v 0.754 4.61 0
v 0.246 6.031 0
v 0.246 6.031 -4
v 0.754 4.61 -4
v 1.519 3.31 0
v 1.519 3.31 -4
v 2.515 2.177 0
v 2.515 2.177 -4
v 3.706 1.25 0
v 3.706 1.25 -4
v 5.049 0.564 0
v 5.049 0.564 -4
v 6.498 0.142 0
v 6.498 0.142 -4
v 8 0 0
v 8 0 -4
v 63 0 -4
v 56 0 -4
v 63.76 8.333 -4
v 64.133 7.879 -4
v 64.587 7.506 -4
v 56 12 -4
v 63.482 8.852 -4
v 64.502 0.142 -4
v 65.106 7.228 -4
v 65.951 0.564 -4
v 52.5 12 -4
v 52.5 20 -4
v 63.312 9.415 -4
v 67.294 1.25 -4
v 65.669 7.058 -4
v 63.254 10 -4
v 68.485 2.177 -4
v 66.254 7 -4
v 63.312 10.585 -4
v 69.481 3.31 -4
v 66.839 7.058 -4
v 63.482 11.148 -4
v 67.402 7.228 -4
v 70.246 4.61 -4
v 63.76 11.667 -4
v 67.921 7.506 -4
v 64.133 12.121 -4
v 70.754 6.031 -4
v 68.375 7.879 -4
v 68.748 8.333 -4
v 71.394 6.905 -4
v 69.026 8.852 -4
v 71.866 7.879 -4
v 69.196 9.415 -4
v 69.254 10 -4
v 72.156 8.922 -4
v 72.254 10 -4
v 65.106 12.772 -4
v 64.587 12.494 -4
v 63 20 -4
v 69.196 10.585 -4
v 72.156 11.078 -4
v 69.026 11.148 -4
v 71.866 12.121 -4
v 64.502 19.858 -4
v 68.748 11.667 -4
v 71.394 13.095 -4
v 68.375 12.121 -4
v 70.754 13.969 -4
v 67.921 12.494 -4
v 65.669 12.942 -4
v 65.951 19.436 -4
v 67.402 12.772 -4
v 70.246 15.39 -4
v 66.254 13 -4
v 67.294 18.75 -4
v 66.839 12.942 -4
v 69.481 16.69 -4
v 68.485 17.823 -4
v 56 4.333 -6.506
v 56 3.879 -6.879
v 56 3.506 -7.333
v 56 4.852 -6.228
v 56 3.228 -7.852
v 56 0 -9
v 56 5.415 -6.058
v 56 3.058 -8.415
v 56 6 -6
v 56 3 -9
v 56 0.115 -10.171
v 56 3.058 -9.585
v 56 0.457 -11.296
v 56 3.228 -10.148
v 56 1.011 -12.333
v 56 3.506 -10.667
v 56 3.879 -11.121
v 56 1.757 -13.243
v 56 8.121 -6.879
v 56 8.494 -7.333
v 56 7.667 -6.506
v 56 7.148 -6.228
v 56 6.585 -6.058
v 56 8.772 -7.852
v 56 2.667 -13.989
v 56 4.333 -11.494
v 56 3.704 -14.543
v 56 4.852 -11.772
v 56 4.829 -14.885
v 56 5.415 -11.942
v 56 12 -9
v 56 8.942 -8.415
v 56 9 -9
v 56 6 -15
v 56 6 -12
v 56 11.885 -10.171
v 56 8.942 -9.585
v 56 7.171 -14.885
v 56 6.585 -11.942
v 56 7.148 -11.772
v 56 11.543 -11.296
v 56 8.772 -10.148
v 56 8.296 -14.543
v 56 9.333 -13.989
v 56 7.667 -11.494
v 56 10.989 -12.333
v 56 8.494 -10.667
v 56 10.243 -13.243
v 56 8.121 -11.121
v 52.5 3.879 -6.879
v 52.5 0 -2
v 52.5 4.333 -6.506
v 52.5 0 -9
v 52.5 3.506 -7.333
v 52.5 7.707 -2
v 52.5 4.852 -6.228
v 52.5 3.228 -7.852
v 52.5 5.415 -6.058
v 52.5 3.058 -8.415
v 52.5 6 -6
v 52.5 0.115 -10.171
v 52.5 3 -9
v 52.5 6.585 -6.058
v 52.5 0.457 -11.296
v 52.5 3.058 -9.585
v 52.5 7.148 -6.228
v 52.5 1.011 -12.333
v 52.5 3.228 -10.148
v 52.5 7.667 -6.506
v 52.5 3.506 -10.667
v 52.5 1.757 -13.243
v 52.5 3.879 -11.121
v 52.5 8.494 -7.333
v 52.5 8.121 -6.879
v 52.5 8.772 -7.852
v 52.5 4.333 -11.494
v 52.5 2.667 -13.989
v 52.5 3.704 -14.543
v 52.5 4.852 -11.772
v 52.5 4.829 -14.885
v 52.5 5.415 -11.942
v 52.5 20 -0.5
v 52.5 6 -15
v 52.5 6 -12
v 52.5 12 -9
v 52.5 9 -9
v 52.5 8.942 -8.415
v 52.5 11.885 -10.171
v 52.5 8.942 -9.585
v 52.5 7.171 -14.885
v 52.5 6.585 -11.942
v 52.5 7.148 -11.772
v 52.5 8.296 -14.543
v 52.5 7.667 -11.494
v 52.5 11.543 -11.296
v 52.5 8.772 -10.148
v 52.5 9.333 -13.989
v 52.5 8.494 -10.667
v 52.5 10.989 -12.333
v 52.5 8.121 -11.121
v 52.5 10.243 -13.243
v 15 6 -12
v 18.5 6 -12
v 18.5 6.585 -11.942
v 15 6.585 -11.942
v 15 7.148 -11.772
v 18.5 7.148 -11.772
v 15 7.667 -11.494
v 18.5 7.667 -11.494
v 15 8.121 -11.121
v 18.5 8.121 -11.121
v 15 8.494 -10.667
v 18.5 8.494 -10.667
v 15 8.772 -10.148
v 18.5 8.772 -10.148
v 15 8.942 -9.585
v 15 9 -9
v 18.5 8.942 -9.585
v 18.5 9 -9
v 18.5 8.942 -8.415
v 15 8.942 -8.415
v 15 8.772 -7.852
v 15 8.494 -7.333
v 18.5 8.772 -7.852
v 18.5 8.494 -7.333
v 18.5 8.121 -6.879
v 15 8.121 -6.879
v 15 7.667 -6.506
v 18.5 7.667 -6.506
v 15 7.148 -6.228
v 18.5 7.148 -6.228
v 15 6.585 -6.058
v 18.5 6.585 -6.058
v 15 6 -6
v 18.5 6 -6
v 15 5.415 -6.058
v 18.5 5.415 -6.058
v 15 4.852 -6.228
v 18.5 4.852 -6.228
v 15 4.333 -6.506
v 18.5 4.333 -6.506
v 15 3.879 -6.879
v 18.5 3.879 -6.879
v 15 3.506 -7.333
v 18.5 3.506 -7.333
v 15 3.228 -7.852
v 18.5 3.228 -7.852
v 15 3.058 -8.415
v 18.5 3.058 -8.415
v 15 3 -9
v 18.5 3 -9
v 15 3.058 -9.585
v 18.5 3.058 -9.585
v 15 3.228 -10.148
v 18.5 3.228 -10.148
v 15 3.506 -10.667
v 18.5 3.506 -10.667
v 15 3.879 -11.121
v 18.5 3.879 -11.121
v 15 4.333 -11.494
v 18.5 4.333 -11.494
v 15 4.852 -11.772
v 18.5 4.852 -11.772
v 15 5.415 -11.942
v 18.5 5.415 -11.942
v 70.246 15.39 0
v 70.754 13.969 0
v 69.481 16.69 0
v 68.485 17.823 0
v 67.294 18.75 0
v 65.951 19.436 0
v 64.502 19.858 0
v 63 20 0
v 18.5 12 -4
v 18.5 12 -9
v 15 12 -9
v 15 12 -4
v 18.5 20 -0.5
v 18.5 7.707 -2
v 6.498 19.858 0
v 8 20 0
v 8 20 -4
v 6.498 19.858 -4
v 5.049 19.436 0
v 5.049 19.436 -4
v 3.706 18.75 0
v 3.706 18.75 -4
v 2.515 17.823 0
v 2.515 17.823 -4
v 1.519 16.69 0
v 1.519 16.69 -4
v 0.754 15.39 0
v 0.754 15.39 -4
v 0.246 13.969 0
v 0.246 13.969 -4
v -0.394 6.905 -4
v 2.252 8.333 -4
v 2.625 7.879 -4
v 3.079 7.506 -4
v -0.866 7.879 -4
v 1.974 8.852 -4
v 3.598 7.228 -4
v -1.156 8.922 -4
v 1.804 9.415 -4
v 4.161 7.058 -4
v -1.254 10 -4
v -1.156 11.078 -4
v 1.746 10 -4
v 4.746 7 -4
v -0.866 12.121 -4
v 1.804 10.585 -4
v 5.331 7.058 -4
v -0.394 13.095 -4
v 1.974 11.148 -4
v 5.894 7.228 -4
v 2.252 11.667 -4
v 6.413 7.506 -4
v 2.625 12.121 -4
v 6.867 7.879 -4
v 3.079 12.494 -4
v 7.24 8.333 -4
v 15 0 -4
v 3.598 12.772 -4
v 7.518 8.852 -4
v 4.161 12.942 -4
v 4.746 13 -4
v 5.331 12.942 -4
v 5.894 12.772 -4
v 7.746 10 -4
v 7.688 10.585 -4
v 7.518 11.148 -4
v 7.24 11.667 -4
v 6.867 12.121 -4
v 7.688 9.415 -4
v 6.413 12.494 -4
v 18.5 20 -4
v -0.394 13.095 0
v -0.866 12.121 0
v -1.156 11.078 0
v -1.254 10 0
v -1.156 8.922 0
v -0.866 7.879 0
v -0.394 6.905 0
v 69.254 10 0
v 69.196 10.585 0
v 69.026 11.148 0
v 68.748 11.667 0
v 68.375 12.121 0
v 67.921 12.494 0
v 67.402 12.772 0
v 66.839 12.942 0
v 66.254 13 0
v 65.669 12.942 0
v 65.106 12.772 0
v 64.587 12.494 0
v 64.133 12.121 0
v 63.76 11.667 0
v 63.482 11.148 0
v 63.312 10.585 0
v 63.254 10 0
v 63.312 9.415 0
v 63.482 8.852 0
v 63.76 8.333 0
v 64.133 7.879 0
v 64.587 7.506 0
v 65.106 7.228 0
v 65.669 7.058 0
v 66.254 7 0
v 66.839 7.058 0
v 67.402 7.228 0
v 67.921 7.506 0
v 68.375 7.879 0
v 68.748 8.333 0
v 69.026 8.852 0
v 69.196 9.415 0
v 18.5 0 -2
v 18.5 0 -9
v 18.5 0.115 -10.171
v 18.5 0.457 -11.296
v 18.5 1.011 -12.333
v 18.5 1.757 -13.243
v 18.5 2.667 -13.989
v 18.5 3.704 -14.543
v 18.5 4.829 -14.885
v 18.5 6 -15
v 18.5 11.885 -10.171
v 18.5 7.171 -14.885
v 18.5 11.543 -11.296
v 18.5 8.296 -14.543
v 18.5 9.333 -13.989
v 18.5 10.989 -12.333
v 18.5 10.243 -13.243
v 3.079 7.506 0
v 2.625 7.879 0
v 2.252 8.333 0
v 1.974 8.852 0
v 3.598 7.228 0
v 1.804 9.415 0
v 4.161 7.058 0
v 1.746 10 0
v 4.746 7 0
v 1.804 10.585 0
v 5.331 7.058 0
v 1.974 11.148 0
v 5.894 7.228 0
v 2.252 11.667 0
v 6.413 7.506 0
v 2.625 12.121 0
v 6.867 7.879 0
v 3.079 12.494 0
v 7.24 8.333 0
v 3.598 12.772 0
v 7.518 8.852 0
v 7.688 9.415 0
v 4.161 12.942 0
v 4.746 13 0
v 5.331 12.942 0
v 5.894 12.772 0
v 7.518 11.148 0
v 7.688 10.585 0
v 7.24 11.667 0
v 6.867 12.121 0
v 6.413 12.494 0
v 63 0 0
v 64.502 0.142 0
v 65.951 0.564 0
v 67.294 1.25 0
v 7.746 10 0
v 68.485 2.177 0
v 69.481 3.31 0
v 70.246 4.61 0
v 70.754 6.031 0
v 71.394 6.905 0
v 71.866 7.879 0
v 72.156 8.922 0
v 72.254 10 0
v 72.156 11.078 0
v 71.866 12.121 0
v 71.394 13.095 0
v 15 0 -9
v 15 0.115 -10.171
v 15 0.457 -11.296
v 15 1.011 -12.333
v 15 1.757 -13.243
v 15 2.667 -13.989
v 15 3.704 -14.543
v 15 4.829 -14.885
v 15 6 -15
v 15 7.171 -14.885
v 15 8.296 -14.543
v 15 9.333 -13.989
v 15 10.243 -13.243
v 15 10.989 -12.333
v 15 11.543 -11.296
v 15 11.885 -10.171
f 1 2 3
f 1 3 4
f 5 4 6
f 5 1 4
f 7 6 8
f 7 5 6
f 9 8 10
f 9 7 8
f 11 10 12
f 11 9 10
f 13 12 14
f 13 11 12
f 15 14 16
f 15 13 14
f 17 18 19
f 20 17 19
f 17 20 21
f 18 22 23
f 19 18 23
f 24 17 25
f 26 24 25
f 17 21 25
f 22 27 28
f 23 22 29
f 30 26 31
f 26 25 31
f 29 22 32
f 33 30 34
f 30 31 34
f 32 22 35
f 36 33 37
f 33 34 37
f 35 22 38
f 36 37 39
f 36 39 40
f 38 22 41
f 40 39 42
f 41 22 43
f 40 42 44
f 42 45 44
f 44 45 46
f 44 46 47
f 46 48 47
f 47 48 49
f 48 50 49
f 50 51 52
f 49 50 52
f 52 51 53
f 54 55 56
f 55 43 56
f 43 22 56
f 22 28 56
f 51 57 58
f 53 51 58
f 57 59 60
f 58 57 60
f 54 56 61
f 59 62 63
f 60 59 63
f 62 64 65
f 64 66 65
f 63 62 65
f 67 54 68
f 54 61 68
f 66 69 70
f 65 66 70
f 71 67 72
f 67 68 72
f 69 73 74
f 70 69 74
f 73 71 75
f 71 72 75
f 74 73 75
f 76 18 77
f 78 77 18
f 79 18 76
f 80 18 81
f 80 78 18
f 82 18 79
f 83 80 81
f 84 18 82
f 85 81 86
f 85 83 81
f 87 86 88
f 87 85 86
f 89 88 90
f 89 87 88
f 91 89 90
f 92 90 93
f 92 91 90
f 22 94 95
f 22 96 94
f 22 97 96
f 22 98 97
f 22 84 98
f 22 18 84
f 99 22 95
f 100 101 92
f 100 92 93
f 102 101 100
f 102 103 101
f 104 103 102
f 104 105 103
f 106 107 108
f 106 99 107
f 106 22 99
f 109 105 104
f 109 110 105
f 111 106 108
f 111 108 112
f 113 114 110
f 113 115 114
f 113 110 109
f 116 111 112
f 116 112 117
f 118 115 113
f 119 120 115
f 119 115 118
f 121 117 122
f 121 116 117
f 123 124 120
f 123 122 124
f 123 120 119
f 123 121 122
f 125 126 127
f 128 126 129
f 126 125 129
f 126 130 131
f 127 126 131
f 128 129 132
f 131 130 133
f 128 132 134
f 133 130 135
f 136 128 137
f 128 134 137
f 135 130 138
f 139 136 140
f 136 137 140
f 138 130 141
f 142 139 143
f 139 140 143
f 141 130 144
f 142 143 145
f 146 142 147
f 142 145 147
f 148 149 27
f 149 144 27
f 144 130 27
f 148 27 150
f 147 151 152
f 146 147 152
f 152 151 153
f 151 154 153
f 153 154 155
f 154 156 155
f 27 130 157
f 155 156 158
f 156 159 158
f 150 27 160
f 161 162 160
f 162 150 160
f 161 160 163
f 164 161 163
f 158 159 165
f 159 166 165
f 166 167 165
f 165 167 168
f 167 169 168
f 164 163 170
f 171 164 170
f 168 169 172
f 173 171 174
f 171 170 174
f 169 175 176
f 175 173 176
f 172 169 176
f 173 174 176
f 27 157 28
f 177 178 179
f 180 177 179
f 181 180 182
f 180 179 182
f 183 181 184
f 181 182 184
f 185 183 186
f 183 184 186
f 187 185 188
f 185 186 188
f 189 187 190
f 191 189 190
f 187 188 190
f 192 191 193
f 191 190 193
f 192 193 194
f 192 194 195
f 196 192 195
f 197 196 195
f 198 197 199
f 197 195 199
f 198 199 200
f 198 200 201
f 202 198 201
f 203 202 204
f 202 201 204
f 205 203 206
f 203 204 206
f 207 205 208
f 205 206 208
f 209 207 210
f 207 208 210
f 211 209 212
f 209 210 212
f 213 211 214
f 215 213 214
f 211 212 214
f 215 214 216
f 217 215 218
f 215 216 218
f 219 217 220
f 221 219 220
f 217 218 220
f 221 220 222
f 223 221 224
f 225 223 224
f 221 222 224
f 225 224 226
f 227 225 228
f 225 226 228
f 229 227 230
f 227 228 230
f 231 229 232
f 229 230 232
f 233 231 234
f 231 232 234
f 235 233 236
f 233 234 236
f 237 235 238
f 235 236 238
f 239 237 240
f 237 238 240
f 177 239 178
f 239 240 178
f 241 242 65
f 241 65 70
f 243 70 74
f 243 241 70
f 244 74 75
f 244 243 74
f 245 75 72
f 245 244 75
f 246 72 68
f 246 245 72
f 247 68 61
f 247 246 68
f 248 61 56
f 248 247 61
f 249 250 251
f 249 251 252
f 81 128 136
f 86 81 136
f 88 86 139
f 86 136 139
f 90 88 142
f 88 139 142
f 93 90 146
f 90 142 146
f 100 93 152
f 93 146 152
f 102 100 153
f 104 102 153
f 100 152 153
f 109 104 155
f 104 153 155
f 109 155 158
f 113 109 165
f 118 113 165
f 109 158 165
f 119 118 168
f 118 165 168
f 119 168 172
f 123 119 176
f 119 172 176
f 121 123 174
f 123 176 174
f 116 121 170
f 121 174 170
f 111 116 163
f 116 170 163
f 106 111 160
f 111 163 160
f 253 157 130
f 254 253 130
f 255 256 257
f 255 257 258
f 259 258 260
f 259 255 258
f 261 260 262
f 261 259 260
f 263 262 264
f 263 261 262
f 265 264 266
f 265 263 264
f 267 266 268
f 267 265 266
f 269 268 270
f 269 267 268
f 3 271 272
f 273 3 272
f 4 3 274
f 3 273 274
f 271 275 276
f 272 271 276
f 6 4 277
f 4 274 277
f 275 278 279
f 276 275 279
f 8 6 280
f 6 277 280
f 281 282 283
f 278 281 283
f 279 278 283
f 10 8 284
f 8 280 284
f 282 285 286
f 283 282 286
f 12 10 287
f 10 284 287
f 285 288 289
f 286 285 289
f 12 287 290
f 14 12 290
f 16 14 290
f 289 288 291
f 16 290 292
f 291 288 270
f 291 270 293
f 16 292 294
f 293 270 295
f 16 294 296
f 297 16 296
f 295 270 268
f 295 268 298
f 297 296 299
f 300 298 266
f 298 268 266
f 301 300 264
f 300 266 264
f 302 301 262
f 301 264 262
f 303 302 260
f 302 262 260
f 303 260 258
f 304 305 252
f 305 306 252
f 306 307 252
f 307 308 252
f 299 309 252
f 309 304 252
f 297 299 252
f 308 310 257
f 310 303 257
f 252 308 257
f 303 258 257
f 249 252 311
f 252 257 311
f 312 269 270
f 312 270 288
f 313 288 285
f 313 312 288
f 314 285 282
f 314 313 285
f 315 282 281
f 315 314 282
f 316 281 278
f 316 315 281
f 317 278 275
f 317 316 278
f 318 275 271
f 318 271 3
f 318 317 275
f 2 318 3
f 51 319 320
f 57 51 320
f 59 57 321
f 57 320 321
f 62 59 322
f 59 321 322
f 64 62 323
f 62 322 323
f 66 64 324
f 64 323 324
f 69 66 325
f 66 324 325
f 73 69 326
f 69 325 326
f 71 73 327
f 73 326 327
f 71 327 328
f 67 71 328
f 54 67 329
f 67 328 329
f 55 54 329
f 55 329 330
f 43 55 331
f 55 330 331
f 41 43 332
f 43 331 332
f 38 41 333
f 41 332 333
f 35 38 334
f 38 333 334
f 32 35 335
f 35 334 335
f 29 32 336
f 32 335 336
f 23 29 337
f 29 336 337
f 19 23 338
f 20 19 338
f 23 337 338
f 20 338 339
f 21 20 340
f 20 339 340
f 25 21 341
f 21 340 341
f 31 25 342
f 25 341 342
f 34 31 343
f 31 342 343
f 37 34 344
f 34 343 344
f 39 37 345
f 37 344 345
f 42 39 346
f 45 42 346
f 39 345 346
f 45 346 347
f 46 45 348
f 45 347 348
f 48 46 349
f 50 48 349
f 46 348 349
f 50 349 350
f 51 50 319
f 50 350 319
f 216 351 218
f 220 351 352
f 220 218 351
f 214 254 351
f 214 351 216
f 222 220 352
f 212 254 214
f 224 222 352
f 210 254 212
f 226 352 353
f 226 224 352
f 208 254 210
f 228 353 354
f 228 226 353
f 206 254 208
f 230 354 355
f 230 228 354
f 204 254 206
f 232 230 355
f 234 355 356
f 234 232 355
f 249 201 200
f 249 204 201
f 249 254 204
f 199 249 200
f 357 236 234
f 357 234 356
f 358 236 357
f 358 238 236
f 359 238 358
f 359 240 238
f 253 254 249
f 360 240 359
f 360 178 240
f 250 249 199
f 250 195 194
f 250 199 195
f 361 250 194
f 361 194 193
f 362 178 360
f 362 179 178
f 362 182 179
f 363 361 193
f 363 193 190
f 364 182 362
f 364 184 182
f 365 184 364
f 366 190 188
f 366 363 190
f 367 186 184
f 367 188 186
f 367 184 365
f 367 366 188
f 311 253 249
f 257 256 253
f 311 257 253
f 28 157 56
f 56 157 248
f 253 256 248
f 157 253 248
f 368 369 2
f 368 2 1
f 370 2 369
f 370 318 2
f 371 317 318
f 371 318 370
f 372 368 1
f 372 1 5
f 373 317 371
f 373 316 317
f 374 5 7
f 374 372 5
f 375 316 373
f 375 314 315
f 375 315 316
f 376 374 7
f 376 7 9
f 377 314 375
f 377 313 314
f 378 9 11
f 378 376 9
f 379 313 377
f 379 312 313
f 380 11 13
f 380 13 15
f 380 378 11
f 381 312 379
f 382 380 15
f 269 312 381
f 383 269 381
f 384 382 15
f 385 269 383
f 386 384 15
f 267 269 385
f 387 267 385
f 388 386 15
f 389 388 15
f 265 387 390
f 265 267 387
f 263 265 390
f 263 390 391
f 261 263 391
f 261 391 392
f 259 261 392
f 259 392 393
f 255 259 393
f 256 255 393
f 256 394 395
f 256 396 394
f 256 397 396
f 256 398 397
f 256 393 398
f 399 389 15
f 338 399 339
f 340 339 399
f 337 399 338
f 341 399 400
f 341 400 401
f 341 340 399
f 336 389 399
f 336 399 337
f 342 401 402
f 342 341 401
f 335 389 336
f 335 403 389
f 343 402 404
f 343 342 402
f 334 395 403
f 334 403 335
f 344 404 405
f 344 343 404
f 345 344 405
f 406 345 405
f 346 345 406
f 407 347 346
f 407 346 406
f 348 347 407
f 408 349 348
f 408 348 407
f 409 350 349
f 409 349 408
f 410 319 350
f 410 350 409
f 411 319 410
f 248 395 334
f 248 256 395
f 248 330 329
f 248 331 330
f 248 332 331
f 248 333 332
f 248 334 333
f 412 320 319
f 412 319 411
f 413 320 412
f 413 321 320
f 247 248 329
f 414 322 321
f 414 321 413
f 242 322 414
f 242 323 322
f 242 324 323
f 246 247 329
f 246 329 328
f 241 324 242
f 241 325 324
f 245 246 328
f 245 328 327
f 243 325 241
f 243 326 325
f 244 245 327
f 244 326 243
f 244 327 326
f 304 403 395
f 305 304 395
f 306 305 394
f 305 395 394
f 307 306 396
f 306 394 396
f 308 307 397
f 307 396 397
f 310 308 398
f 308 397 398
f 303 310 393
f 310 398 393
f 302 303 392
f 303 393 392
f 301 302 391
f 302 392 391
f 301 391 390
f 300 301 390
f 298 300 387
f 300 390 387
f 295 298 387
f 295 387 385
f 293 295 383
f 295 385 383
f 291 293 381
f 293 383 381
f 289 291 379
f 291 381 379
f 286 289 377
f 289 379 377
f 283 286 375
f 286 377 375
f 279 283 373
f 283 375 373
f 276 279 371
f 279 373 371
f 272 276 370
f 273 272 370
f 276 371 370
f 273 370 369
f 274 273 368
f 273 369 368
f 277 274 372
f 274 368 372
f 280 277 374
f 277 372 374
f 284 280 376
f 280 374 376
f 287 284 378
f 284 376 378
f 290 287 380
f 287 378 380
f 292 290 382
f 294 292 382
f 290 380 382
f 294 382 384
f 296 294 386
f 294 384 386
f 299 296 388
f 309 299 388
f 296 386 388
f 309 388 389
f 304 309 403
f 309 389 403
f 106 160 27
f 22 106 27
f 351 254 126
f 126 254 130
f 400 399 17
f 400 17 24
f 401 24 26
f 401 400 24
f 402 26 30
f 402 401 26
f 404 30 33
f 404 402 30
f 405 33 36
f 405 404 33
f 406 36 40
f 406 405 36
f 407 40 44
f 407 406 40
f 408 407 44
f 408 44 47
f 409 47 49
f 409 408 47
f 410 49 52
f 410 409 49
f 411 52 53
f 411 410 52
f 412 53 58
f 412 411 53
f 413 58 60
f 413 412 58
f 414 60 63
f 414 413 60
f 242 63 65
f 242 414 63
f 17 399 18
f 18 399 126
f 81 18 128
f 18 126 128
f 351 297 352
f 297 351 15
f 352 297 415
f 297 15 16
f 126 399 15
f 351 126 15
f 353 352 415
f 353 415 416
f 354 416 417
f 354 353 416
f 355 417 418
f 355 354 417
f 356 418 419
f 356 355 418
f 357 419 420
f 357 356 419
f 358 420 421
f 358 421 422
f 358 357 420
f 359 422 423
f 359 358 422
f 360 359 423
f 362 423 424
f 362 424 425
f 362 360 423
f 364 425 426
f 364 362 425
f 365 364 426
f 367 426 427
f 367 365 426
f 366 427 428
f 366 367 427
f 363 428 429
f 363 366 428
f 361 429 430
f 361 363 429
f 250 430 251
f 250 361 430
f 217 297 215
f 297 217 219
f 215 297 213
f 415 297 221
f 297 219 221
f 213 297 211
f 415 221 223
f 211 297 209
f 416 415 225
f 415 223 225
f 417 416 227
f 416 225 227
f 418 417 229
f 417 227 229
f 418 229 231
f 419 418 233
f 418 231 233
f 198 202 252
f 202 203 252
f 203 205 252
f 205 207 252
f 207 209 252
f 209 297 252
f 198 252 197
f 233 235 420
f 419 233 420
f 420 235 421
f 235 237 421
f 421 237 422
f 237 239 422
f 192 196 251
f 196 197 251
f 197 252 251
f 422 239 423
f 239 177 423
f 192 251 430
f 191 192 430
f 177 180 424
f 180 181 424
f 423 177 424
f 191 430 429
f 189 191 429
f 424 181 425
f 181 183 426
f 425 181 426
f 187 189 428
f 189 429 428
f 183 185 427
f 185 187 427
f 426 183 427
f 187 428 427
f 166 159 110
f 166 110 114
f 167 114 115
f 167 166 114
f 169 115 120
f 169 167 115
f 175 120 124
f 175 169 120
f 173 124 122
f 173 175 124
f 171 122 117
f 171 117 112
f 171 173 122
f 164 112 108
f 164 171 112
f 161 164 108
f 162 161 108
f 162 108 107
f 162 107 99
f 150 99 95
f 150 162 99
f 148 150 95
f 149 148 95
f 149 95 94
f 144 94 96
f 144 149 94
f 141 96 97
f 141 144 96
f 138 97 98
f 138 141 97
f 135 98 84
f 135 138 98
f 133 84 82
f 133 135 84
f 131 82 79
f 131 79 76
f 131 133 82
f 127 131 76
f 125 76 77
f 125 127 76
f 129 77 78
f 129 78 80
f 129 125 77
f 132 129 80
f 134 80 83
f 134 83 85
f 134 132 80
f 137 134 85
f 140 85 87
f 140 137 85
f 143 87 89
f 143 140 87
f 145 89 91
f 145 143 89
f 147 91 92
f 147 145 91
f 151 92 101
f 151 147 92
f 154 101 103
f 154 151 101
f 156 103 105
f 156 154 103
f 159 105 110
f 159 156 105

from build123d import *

# Parameters (mm, degrees)
SKETCH1_R             = 3
BOSS_EXTRUDE3_DEPTH   = 4
BOSS_EXTRUDE3_2_DEPTH = 4
SKETCH1_9_W           = 34
SKETCH1_9_H           = 20
BOSS_EXTRUDE4_DEPTH   = 2
CUT_EXTRUDE1_DEPTH    = 34
SKETCH3_R             = 3
BOSS_EXTRUDE5_DEPTH   = 3.5


with BuildPart() as part:
    # Sketch1 → Boss-Extrude3 (new body)
    with BuildSketch(Plane.XY):
        with BuildLine():
            ThreePointArc((0.246000737, 6.031372198), (3.088229566, 1.685373233), (8, 0))
            Line((8, 0), (18.5, 0))
            Line((18.5, 0), (18.5, 20))
            Line((18.5, 20), (8, 20))
            ThreePointArc((8, 20), (3.088229566, 18.314626767), (0.246000737, 13.968627802))
            ThreePointArc((0.246000737, 13.968627802), (-1.254, 10), (0.246000737, 6.031372198))
        make_face()
        with Locations((4.746, 10)):
            Circle(SKETCH1_R, mode=Mode.SUBTRACT)
    extrude(amount=-BOSS_EXTRUDE3_DEPTH)



with BuildPart() as body_2:
    # Sketch1 → Boss-Extrude3 2 (new body)
    with BuildSketch(Plane.XY):
        with BuildLine():
            Line((52.5, 20), (52.5, 0))
            Line((52.5, 0), (63, 0))
            ThreePointArc((63, 0), (67.911770434, 1.685373233), (70.753999263, 6.031372198))
            ThreePointArc((70.753999263, 6.031372198), (72.254, 10), (70.753999263, 13.968627802))
            ThreePointArc((70.753999263, 13.968627802), (67.911770434, 18.314626767), (63, 20))
            Line((63, 20), (52.5, 20))
        make_face()
        with Locations((66.254, 10)):
            Circle(SKETCH1_R, mode=Mode.SUBTRACT)
    extrude(amount=-BOSS_EXTRUDE3_2_DEPTH)


with BuildPart() as part_1:
    add(part.part)

    add(body_2.part)  # Boss-Extrude4 merges body 2
    # Sketch1<9> → Boss-Extrude4 (add)
    with BuildSketch(Plane.XY):
        with Locations((35.5, 10)):
            Rectangle(SKETCH1_9_W, SKETCH1_9_H)
    extrude(amount=-BOSS_EXTRUDE4_DEPTH)

    # Sketch2 → Cut-Extrude1 (cut)
    with BuildSketch(Plane(origin=(18.5, 0, 0), x_dir=(0, 0, -1), z_dir=(1, 0, 0))):
        Polygon((2, 20), (0.5, 20), (2, 7.70719), align=None)
    extrude(amount=CUT_EXTRUDE1_DEPTH, mode=Mode.SUBTRACT)

    # Sketch3 → Boss-Extrude5 (add)
    with BuildSketch(Plane(origin=(18.5, 0, 0), x_dir=(0, 0, -1), z_dir=(1, 0, 0))):
        with BuildLine():
            Line((4, 0), (9, 0))
            ThreePointArc((9, 0), (15, 6), (9, 12))
            Line((9, 12), (4, 12))
            Line((4, 12), (4, 0))
        make_face()
        with Locations((9, 6)):
            Circle(SKETCH3_R, mode=Mode.SUBTRACT)
    boss_extrude5 = extrude(amount=-BOSS_EXTRUDE5_DEPTH)

    # Mirror1: Boss-Extrude5 across plane
    add(boss_extrude5.mirror(Plane(origin=(35.5, 0, 0), x_dir=(0, 0, 1), z_dir=(1, 0, 0))))


solid = part_1.part
